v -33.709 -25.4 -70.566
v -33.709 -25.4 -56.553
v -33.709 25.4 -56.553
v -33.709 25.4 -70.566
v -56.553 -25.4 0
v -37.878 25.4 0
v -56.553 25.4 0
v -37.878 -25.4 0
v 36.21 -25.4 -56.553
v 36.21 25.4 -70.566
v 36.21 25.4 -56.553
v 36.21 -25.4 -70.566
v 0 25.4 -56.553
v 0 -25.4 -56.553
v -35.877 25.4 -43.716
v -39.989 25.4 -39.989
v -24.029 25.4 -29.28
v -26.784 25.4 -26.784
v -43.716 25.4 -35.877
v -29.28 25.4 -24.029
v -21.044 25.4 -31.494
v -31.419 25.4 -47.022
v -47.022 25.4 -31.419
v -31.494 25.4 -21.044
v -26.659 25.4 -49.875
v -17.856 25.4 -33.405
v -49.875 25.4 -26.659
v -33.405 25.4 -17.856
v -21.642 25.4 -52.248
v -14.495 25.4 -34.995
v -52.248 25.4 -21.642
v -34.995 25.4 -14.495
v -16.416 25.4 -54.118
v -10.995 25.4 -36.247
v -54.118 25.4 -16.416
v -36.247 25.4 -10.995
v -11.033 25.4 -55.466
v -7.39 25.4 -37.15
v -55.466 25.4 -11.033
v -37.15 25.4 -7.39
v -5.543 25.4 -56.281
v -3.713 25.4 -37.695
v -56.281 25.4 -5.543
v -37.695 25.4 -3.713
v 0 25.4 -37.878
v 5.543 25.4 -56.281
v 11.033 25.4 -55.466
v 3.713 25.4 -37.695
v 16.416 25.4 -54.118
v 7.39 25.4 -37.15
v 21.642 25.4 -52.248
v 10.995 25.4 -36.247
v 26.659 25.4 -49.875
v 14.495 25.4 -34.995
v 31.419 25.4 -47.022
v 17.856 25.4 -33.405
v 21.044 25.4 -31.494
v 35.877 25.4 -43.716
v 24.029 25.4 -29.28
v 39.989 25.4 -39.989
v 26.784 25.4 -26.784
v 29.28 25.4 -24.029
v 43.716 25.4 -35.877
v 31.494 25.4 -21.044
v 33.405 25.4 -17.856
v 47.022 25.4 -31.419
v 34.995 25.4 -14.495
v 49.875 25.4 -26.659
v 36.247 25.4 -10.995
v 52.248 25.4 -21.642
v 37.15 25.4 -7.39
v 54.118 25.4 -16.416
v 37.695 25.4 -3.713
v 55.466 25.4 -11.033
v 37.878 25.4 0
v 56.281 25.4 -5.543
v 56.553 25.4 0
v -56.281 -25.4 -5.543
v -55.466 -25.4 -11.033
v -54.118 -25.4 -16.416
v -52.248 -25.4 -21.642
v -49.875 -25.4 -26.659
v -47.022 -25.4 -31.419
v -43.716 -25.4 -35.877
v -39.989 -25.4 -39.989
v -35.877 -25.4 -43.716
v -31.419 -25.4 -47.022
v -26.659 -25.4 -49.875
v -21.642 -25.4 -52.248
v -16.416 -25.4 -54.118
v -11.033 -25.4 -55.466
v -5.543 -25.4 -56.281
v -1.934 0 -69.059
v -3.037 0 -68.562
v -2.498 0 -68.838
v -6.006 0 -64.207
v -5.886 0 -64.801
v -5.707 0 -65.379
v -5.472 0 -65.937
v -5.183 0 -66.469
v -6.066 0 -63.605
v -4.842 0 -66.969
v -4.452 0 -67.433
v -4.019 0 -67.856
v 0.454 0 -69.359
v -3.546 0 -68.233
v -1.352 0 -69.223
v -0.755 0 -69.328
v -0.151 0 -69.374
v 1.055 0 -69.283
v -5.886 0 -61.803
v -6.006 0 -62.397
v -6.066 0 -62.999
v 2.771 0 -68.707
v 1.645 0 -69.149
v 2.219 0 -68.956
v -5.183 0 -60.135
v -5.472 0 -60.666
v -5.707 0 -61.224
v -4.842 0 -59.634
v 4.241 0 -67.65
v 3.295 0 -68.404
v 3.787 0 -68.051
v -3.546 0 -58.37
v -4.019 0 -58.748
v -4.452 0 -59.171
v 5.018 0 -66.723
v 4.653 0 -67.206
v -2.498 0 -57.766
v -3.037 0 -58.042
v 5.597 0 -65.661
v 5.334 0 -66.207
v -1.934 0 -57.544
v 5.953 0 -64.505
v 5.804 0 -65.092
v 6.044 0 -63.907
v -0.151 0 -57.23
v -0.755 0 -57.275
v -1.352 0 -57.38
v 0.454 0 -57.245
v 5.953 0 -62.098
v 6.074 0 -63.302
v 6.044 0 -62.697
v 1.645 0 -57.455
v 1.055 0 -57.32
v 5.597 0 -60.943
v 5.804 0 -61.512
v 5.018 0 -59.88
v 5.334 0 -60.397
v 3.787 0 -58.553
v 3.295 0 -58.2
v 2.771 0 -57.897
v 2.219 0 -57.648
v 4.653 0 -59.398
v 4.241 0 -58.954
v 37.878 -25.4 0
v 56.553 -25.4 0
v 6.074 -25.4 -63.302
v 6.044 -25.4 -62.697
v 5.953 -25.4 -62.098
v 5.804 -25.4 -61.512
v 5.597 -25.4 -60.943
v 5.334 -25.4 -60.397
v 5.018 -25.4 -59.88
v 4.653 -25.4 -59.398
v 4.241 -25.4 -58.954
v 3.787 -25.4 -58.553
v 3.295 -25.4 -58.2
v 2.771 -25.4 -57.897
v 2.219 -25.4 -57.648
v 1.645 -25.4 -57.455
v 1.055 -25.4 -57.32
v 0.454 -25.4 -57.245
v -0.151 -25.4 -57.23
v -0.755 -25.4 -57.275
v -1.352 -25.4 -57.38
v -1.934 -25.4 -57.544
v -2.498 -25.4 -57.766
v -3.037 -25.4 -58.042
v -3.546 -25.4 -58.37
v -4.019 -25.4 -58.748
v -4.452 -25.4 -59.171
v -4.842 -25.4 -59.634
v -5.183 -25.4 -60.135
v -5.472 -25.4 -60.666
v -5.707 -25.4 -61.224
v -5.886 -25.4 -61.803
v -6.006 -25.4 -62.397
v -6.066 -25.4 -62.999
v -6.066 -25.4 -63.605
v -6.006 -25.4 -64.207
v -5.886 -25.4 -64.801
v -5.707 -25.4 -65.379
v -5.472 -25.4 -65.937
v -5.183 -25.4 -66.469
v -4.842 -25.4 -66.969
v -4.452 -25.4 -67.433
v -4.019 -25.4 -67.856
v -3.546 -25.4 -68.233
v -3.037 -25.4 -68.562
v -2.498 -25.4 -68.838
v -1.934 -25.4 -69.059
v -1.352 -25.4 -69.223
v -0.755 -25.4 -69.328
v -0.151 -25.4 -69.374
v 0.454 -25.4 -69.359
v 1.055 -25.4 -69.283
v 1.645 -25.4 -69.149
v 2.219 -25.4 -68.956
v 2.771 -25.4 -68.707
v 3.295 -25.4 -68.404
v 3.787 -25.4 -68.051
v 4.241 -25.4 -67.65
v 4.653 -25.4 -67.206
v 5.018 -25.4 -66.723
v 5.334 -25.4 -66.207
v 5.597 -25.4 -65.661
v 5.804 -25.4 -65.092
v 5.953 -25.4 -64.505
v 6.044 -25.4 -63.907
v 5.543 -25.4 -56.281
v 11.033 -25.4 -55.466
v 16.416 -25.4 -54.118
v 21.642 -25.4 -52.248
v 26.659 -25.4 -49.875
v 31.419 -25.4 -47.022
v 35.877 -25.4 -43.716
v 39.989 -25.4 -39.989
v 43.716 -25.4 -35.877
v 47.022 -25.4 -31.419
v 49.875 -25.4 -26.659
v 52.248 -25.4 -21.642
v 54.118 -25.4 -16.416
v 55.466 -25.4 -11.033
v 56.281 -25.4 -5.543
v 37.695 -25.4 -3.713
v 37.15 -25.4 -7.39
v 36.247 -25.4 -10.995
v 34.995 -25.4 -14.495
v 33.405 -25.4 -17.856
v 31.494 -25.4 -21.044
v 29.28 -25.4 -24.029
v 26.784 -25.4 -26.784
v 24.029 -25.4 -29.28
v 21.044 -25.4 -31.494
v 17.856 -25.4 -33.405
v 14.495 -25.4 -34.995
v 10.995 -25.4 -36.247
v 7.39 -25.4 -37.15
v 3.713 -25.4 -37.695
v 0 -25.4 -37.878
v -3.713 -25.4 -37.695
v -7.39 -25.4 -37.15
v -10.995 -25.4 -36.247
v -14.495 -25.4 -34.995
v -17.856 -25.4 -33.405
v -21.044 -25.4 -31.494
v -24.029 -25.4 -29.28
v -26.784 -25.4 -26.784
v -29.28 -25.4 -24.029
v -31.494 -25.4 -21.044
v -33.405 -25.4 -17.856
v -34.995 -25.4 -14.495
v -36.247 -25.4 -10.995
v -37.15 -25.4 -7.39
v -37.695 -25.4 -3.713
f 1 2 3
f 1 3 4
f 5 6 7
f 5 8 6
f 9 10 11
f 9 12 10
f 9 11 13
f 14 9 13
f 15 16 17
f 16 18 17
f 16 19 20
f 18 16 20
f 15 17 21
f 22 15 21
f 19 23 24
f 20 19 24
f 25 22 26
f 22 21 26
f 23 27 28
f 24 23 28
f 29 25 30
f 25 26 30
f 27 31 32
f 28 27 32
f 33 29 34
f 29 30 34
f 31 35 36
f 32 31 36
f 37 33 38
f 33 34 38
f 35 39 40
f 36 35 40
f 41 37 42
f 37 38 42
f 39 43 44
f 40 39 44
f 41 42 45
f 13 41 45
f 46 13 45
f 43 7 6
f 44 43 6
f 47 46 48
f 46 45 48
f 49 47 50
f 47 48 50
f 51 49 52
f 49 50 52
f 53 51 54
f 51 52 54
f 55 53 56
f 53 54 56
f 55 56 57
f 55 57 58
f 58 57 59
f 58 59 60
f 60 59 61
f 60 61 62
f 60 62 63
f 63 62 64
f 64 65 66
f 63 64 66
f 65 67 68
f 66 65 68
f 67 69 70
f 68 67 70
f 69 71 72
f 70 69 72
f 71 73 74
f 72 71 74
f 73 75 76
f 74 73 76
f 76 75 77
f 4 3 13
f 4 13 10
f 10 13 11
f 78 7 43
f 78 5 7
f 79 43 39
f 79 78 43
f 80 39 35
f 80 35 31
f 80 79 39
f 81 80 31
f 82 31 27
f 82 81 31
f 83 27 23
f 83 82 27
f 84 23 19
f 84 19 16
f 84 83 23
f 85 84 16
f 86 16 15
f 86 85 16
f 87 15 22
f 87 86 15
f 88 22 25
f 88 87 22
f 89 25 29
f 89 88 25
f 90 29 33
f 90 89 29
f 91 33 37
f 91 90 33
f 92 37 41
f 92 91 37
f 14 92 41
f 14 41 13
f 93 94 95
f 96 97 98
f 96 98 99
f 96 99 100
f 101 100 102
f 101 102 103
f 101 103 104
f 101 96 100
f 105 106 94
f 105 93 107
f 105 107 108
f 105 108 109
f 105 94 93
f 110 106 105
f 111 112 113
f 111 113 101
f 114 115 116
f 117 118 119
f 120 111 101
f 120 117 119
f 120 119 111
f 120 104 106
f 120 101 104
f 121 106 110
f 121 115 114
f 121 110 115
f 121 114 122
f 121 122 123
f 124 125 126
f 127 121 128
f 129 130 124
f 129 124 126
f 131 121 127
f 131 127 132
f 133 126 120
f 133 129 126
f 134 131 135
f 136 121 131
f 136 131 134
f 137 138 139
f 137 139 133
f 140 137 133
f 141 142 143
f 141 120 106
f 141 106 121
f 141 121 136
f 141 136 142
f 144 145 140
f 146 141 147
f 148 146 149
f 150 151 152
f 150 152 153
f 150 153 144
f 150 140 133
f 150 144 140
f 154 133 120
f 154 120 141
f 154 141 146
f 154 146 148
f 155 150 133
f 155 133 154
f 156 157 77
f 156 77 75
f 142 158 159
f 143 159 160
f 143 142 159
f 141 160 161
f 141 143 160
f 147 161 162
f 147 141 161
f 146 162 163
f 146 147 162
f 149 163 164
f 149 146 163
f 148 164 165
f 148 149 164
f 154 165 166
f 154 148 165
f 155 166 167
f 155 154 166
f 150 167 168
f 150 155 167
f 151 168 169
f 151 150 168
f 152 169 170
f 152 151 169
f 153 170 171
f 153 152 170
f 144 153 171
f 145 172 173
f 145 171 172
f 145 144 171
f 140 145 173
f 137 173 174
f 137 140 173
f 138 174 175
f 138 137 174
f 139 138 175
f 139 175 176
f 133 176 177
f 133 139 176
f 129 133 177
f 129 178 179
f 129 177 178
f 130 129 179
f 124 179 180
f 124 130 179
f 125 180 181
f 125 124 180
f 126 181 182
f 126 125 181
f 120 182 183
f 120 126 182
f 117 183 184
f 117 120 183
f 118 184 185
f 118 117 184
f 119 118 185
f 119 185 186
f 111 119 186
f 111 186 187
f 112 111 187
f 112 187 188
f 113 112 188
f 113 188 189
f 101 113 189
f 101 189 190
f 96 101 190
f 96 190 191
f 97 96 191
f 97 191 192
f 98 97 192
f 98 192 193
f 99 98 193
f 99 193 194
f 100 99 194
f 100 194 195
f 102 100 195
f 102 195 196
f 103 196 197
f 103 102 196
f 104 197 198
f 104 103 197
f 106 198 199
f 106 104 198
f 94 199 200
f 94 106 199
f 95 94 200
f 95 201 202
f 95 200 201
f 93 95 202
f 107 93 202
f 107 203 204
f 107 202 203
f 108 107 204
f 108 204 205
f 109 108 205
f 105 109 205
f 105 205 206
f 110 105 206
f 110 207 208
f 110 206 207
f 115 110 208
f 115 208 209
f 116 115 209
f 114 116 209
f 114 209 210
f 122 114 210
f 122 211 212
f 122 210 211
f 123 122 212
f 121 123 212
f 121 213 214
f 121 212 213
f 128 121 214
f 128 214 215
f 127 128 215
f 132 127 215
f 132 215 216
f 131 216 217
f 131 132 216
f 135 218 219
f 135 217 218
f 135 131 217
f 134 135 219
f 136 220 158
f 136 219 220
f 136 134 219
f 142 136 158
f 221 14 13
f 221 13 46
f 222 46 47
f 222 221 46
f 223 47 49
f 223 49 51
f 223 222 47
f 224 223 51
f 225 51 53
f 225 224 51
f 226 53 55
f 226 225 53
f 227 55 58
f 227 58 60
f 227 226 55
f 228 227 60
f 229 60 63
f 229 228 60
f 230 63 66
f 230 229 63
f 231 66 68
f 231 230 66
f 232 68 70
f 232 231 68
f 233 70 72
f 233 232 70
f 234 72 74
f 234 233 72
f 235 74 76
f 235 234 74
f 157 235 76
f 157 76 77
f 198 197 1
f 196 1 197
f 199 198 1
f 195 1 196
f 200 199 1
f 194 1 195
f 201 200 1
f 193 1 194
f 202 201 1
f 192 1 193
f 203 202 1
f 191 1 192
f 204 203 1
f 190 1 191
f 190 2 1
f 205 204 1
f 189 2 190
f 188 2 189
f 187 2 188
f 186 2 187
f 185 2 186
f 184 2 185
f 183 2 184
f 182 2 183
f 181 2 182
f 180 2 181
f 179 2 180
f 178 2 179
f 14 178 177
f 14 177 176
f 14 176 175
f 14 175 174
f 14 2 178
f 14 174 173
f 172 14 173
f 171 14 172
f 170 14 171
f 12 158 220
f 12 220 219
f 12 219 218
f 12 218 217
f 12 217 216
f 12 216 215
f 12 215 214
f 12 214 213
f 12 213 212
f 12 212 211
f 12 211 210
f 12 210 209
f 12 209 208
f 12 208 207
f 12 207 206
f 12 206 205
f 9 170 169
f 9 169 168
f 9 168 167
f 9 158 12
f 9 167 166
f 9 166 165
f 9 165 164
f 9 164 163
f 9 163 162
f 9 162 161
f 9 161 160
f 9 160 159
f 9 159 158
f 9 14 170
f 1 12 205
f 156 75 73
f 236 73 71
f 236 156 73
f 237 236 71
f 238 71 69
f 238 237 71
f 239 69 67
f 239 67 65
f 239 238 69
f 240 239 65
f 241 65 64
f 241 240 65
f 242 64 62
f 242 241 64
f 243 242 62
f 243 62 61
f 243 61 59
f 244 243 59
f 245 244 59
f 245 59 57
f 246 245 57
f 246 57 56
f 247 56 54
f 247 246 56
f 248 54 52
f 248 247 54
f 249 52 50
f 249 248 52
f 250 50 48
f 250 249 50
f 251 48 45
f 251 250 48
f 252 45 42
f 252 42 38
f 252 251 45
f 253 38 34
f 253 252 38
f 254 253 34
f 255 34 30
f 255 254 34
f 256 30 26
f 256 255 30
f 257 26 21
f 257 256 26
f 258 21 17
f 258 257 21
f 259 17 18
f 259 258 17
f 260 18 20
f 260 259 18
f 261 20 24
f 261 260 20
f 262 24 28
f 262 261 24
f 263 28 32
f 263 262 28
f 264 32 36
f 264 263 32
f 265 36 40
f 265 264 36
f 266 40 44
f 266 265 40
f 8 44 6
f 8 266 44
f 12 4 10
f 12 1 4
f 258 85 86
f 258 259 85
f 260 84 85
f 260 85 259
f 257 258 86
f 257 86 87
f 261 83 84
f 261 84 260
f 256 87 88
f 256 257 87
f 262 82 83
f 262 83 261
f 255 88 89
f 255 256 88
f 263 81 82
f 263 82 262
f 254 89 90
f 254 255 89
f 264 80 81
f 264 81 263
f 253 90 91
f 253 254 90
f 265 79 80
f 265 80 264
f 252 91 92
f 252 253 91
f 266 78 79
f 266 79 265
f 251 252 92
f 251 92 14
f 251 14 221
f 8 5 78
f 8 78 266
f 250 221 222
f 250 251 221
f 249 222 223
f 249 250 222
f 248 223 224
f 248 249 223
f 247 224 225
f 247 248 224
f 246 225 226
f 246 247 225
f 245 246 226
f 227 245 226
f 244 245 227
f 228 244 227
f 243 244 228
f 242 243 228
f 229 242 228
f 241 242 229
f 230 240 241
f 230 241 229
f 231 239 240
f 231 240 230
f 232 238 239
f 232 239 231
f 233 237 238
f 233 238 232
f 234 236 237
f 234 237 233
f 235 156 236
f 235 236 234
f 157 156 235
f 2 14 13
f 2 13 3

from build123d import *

# Parameters (mm, degrees)
F2_DEPTH = 25.4
F1_R     = 6.073794
F3_DEPTH = 134.878621


with BuildPart() as f2:
    # F0 (on Front) → F2 (new body, symmetric)
    with BuildSketch(Plane.XZ):
        with BuildLine():
            Line((-37.877875, 0), (-56.552951, 0))
            ThreePointArc((-56.552951, 0), (-39.988975, -39.988975), (0, -56.552951))
            ThreePointArc((0, -56.552951), (39.988975, -39.988975), (56.552951, 0))
            Line((56.552951, 0), (37.877875, 0))
            ThreePointArc((37.877875, 0), (0, -37.877875), (-37.877875, 0))
        make_face()
        Polygon((36.210477, -56.552951), (0, -56.552951), (-33.709429, -56.552951), (-33.709429, -70.566222), (36.210477, -70.566222), align=None)
    extrude(amount=F2_DEPTH, both=True)

    # F1 (on Front) → F3 (cut)
    with BuildSketch(Plane.XZ):
        with Locations((0, -63.301817)):
            Circle(F1_R)
    extrude(amount=F3_DEPTH, mode=Mode.SUBTRACT)


solid = f2.part
